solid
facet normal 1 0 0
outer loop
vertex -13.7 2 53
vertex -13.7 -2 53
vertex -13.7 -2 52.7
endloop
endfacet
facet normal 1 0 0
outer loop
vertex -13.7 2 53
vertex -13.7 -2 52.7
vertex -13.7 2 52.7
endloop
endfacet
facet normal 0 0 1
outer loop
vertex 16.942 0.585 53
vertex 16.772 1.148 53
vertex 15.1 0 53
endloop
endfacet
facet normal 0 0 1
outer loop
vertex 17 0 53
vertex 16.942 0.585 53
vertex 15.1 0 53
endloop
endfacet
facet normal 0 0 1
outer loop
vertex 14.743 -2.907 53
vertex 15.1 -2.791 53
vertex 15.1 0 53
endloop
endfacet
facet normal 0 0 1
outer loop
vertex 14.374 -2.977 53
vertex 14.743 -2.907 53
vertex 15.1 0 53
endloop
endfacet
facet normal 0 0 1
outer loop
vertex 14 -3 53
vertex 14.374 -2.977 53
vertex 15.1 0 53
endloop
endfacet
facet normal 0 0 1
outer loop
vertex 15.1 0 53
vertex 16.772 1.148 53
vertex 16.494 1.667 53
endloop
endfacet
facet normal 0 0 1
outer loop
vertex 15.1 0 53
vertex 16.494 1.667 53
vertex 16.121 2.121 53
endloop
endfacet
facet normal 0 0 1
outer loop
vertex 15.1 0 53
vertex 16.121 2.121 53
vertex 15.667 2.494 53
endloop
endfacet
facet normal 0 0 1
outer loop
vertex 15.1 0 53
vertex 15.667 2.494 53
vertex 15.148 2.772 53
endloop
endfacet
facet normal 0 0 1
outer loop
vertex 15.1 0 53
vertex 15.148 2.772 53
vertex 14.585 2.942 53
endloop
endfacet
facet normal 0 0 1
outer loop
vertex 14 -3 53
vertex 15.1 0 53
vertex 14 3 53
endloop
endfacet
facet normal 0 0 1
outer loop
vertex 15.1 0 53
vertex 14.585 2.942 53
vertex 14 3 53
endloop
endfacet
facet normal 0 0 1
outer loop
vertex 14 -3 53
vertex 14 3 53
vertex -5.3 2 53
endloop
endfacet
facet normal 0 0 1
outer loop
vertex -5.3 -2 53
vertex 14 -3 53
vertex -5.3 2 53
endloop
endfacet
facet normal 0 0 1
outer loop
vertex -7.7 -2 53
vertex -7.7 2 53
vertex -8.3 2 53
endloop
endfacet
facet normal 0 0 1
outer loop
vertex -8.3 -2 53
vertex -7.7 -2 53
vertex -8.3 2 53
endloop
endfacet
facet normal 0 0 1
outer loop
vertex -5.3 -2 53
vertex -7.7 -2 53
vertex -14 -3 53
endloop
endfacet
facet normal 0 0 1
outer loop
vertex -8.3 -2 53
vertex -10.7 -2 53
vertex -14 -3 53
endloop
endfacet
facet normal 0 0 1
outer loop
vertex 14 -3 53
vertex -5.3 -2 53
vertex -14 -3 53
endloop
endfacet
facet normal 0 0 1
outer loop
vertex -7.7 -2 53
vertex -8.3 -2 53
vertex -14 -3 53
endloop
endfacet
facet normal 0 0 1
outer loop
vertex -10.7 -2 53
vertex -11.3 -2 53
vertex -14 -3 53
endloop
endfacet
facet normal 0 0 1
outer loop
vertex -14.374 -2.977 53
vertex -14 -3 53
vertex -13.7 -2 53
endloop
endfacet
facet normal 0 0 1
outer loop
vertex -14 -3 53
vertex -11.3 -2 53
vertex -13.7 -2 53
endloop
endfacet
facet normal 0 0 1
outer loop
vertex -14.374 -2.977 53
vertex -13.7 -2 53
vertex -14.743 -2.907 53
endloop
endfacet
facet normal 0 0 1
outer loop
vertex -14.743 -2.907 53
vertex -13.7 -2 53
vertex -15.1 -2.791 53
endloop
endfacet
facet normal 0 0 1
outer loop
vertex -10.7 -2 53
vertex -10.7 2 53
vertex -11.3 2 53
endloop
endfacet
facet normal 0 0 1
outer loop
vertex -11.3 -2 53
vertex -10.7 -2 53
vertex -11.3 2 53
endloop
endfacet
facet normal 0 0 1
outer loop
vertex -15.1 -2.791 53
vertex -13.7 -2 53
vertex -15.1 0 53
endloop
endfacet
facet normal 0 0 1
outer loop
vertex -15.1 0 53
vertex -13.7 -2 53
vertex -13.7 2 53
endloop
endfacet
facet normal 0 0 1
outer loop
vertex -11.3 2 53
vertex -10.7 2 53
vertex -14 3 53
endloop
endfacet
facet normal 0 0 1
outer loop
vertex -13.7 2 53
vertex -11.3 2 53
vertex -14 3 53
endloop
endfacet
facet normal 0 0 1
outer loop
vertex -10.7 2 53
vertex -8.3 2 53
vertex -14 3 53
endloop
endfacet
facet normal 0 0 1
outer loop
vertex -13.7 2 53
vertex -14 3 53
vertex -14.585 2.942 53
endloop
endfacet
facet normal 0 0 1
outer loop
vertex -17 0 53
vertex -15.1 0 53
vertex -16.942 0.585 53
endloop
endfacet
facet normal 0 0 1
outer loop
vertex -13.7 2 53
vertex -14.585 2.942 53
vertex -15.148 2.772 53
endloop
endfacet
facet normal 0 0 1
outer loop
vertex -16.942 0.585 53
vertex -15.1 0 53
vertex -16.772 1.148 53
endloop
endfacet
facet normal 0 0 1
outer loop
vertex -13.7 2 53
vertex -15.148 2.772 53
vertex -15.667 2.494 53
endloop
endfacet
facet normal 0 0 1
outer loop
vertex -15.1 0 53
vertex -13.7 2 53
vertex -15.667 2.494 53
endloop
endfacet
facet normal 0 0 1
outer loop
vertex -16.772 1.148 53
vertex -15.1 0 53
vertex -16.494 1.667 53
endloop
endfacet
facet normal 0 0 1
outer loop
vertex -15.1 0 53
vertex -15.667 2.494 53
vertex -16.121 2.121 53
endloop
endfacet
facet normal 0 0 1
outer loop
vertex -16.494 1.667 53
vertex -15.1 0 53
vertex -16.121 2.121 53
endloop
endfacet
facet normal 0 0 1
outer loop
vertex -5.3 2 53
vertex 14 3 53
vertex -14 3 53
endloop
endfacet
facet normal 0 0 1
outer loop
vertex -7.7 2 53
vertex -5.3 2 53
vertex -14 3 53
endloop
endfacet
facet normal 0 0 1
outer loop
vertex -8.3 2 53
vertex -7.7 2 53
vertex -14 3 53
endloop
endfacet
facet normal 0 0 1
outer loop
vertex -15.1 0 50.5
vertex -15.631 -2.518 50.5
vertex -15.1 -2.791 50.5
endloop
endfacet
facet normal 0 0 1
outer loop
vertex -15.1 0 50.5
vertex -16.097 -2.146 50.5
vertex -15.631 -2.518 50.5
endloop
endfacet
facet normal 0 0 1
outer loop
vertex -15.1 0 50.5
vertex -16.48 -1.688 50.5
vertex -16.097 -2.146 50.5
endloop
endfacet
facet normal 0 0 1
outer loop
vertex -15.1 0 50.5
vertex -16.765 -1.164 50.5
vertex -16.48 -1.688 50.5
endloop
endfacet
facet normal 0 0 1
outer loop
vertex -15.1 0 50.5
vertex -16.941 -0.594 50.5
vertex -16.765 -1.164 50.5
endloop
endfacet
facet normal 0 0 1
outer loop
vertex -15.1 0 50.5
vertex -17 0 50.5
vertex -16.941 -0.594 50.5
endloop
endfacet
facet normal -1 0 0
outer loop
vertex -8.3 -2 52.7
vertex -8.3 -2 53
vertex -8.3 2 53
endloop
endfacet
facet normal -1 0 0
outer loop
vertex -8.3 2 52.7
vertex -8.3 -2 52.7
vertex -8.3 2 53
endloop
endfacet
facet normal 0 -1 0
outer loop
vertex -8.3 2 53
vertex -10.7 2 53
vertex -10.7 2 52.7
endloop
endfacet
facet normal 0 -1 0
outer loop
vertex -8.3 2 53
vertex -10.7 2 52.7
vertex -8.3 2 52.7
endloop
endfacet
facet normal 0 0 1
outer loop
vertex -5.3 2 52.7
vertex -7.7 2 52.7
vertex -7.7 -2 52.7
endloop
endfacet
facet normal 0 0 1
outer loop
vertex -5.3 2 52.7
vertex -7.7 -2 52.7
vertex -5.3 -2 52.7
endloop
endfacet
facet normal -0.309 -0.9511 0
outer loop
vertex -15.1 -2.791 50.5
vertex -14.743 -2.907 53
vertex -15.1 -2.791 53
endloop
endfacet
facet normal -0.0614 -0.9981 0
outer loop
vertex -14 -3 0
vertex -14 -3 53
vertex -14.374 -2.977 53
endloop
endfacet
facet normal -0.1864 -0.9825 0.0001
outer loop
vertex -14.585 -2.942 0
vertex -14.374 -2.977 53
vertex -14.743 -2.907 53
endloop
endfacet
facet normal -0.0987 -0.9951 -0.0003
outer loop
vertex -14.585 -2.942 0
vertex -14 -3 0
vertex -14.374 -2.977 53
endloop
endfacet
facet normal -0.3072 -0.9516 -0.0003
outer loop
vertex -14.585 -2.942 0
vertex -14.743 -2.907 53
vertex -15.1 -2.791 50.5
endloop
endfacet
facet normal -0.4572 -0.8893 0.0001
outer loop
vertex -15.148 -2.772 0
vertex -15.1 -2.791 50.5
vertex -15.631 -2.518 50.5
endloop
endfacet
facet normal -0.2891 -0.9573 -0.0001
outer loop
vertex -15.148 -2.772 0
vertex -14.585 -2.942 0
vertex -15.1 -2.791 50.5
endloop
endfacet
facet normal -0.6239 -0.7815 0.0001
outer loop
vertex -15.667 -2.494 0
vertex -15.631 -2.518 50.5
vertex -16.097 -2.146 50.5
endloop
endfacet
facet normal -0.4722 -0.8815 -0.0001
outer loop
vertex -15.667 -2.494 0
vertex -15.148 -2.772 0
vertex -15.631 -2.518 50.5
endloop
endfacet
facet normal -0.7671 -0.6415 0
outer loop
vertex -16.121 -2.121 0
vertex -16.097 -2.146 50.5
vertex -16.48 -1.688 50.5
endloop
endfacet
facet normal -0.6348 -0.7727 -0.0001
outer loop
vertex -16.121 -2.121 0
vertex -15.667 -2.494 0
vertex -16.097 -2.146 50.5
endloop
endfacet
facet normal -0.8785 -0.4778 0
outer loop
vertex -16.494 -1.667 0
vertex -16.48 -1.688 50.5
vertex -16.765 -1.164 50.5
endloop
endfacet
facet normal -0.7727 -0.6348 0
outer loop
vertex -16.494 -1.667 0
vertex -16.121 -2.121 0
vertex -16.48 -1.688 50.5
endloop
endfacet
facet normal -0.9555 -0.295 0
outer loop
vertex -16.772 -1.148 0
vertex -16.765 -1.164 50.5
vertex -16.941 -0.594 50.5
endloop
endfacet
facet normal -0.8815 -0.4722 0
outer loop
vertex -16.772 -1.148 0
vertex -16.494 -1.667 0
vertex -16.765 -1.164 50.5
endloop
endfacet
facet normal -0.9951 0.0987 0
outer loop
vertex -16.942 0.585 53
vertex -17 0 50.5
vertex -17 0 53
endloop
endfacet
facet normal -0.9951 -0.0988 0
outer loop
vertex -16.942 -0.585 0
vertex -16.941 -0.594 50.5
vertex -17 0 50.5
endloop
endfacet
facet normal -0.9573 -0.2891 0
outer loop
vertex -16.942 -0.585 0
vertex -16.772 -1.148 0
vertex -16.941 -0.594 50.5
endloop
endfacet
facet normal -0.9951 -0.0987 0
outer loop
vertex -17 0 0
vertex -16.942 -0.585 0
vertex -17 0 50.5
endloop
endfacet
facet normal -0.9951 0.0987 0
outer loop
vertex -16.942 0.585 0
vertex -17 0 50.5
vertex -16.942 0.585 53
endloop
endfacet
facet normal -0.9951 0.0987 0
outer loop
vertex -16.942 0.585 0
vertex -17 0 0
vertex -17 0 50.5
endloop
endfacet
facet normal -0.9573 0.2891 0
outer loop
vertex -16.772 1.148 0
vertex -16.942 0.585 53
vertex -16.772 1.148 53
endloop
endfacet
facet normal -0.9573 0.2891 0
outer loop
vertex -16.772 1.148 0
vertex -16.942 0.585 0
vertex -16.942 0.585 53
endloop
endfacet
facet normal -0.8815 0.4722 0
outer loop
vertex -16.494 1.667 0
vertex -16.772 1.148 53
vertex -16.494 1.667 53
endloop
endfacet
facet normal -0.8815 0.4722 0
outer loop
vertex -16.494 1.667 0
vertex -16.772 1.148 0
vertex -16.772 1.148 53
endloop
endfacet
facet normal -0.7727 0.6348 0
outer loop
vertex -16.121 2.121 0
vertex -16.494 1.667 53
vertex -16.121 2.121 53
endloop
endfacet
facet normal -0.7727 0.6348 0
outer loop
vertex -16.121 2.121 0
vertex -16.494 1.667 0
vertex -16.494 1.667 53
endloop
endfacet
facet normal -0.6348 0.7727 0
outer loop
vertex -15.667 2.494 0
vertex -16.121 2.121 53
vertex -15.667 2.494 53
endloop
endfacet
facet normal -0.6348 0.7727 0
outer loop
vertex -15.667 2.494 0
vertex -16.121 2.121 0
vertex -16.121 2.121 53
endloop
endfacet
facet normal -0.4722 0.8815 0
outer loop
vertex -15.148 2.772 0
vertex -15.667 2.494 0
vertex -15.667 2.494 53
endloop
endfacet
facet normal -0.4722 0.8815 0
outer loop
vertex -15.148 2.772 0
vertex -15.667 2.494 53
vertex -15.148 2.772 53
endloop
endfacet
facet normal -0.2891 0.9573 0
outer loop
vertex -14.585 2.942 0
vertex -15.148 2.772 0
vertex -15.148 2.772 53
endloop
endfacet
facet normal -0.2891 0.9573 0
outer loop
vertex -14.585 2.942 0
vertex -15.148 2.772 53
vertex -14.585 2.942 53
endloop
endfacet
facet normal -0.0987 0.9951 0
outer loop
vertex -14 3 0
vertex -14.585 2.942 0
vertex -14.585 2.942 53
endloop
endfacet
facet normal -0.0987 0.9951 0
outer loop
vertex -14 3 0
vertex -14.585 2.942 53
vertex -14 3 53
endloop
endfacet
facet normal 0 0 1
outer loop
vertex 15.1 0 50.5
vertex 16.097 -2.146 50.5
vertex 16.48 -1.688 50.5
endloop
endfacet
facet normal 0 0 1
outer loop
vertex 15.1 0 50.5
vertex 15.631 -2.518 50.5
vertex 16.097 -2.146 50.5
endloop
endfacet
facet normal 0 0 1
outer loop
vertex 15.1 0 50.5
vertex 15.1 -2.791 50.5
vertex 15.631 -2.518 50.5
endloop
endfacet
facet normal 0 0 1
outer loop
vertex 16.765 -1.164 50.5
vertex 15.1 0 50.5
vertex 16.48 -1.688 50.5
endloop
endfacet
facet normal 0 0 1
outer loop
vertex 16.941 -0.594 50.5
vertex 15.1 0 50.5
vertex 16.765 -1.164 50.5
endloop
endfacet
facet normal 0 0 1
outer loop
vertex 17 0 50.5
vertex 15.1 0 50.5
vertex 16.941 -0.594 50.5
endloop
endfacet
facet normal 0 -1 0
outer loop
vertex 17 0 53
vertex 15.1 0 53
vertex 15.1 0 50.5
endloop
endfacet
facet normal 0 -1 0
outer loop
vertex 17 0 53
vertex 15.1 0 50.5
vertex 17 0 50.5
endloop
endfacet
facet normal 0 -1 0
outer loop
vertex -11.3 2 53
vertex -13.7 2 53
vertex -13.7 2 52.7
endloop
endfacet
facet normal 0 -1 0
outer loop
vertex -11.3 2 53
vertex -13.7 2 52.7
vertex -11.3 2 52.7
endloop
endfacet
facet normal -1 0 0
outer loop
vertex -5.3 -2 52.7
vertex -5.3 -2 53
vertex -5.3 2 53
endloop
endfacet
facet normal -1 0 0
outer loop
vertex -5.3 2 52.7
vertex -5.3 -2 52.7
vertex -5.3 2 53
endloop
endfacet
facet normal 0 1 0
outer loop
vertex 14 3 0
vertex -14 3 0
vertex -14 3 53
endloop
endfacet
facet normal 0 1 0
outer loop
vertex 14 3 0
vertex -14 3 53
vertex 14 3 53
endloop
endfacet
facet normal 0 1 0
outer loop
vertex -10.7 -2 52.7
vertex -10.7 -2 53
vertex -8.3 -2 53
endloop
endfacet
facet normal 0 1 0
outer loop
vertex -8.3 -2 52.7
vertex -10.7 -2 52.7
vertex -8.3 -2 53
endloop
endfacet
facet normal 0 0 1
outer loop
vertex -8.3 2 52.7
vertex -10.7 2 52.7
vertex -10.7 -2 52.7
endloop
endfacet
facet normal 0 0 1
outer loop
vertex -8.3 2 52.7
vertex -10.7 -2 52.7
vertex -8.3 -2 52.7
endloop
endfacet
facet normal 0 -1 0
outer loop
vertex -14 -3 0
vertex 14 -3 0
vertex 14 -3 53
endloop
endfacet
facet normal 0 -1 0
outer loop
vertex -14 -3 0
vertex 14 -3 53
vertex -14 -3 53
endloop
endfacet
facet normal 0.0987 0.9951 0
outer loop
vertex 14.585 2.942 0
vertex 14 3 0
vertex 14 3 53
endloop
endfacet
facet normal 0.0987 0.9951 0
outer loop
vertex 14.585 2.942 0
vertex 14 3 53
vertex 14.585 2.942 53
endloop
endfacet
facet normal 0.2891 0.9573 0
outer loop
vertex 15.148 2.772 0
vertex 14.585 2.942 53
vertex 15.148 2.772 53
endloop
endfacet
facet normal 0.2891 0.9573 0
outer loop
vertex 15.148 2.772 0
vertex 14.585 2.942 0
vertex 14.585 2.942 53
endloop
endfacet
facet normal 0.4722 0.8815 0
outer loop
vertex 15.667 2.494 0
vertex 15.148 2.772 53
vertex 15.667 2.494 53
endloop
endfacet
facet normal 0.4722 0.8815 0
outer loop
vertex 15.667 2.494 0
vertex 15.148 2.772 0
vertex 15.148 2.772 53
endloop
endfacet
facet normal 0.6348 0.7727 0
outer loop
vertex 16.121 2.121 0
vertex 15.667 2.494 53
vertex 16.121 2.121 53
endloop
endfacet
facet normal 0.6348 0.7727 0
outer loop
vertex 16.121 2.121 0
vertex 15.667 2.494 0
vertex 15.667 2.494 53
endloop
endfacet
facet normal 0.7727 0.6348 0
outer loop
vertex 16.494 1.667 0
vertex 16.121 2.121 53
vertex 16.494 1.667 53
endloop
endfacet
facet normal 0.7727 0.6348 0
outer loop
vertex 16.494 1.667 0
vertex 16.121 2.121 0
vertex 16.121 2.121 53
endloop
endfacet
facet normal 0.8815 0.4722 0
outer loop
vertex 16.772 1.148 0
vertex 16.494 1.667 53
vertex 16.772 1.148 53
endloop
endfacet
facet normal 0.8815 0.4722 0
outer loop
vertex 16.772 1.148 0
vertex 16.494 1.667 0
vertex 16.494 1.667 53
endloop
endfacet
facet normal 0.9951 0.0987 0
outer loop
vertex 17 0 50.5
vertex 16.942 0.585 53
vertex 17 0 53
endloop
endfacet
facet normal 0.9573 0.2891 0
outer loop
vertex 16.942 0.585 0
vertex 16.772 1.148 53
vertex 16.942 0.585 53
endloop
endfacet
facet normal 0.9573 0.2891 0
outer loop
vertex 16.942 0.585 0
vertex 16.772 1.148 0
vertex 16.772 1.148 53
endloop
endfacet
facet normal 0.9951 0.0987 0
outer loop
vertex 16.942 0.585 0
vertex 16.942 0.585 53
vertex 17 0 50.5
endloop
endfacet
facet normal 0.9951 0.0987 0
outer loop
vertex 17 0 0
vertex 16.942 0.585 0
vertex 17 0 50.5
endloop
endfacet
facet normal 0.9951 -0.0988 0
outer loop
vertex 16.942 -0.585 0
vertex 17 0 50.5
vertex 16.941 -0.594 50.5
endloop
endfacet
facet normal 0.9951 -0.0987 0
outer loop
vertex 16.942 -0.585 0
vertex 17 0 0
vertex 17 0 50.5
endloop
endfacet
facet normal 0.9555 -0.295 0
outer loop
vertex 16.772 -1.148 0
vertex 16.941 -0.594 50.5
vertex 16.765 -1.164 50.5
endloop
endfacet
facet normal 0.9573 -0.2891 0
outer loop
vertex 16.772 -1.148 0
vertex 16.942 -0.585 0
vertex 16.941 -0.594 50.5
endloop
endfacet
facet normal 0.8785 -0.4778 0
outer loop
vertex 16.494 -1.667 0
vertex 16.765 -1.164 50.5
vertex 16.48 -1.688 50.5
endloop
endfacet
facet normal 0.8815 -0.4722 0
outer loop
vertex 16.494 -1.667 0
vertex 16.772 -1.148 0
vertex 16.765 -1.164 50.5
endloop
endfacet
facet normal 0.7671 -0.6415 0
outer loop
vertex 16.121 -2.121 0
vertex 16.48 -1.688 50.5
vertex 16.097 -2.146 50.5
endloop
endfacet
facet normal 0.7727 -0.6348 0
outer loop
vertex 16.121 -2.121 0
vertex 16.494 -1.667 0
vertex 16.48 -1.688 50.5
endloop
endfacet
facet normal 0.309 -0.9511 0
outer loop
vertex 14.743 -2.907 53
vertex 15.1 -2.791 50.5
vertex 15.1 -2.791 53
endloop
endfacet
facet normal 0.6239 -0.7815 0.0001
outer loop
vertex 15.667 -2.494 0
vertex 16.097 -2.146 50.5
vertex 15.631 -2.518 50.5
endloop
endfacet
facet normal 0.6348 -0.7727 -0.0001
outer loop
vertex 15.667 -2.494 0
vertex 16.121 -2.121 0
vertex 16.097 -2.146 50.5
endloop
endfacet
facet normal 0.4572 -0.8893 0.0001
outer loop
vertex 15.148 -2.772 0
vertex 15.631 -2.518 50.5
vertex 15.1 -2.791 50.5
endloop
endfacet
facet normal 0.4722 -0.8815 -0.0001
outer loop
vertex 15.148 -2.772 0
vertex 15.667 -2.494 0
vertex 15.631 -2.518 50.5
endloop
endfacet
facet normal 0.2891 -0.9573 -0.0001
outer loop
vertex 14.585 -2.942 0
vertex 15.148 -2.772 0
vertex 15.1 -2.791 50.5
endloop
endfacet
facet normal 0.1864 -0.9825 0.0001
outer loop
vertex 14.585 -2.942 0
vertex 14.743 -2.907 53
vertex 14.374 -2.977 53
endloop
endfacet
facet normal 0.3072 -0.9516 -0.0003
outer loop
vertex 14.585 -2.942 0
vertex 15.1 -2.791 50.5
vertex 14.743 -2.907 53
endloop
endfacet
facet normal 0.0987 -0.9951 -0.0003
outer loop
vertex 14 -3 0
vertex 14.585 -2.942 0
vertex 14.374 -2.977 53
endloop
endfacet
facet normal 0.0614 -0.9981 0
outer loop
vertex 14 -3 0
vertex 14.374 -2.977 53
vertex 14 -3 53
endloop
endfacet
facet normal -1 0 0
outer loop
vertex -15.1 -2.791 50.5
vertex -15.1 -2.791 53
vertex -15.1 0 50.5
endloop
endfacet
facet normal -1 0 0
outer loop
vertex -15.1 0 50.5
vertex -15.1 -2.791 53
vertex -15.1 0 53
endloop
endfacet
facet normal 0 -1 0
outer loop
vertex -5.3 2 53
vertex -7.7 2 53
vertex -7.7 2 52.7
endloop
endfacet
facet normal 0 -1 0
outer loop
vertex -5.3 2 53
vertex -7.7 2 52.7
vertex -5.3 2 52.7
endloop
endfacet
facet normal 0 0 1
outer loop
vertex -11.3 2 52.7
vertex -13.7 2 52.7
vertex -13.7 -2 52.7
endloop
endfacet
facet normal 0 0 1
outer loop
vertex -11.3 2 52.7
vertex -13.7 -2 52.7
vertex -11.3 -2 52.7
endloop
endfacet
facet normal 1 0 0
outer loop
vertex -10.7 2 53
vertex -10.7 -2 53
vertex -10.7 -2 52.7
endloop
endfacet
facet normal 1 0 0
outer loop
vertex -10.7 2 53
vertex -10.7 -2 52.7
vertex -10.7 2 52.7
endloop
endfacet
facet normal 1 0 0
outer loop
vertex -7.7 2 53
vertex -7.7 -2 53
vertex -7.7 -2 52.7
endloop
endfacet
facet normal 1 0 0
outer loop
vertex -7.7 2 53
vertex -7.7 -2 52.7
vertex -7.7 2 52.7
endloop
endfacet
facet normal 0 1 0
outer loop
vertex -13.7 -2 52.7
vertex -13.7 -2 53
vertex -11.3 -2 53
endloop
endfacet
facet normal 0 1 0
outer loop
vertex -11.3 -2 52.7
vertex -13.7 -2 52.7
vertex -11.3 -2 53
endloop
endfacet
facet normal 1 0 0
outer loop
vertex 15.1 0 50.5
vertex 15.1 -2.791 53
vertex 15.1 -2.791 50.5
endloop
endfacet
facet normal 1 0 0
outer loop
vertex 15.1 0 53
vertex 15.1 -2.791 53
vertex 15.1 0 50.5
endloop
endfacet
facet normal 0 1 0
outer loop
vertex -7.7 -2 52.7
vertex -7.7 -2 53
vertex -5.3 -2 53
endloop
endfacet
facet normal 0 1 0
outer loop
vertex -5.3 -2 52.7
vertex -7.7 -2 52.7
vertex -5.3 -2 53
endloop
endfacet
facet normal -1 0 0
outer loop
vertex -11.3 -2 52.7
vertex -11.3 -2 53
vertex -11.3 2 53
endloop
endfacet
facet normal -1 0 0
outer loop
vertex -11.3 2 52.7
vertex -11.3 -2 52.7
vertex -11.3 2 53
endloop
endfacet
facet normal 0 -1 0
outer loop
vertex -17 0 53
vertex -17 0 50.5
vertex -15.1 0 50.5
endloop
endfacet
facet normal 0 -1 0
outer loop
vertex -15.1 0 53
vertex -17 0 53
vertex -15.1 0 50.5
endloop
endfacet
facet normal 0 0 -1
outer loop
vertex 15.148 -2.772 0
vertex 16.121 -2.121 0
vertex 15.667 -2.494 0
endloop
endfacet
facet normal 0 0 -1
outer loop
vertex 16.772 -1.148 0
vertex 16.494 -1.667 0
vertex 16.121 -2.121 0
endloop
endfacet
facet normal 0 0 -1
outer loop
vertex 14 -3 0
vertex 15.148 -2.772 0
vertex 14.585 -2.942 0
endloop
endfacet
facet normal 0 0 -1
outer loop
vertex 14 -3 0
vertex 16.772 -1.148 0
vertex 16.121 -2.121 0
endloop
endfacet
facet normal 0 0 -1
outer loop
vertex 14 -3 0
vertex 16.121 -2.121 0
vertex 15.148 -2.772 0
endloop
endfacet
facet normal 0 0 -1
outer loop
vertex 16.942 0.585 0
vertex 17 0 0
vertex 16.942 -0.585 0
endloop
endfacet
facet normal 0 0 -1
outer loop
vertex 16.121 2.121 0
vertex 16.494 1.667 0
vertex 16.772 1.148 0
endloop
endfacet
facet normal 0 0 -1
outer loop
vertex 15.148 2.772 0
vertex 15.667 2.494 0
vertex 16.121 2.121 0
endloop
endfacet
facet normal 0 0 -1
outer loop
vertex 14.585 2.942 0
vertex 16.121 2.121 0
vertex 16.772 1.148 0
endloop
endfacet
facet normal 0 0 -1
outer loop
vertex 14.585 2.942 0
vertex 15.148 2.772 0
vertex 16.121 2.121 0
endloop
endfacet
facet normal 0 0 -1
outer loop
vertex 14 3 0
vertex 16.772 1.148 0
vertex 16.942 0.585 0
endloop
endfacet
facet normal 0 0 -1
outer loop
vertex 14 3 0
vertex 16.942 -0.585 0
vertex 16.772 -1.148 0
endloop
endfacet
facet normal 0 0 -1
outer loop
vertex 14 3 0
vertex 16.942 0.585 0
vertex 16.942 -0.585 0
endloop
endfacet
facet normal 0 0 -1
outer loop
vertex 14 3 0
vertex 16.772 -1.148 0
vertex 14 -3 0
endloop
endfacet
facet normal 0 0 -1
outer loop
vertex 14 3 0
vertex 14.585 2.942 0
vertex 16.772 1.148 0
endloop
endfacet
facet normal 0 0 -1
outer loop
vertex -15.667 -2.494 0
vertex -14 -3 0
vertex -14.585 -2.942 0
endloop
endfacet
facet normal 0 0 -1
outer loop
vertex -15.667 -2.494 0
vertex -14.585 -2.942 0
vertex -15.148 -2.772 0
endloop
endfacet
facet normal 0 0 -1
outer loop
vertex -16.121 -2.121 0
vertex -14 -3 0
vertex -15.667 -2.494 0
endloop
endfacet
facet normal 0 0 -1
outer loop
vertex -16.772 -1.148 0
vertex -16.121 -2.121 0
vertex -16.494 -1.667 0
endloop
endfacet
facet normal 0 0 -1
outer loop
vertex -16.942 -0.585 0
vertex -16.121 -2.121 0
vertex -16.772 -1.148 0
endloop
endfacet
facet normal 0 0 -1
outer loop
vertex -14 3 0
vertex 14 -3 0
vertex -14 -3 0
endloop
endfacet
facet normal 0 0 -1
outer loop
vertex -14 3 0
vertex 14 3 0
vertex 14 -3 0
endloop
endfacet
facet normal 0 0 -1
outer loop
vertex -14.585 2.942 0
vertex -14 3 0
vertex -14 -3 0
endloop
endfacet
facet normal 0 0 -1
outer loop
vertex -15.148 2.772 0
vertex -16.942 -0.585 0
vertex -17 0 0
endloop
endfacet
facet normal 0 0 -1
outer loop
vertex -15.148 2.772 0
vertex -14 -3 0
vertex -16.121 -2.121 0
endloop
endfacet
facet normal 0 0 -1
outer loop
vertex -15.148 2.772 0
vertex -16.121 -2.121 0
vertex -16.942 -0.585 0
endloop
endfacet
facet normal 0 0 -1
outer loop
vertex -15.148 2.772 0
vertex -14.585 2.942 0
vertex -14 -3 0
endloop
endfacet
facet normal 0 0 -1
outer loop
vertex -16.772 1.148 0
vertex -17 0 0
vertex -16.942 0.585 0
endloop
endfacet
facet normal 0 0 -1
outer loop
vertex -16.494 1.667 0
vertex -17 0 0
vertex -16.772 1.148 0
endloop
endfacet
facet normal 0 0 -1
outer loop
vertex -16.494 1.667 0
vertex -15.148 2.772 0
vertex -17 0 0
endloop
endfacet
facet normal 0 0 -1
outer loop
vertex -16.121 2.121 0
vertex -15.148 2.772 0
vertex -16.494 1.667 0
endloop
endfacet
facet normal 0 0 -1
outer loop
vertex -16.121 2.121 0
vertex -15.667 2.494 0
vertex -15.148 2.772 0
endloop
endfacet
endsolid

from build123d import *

# Parameters (mm, degrees)
BOSS_EXTRUDE1_DEPTH = 53
SKETCH2_W           = 2.4
SKETCH2_H           = 4
CUT_EXTRUDE1_DEPTH  = 0.3
SKETCH3_W           = 4
SKETCH3_H           = 4
CUT_EXTRUDE2_DEPTH  = 2.5


with BuildPart() as part:
    # Sketch1 → Boss-Extrude1 (new body)
    with BuildSketch(Plane.XY):
        with BuildLine():
            Line((-14, 3), (14, 3))
            ThreePointArc((14, 3), (17, 0), (14, -3))
            Line((14, -3), (-14, -3))
            ThreePointArc((-14, -3), (-17, 0), (-14, 3))
        make_face()
    extrude(amount=BOSS_EXTRUDE1_DEPTH)

    # Sketch2 → Cut-Extrude1 (cut)
    with BuildSketch(Plane.XY.offset(53)):
        with Locations((-12.5, 0)):
            Rectangle(SKETCH2_W, SKETCH2_H)
        with Locations((-9.5, 0)):
            Rectangle(SKETCH2_W, SKETCH2_H)
        with Locations((-6.5, 0)):
            Rectangle(SKETCH2_W, SKETCH2_H)
    extrude(amount=-CUT_EXTRUDE1_DEPTH, mode=Mode.SUBTRACT)

    # Sketch3 → Cut-Extrude2 (cut)
    with BuildSketch(Plane.XY.offset(53)):
        with Locations((-17.1, -2)):
            Rectangle(SKETCH3_W, SKETCH3_H)
        with Locations((17.1, -2)):
            Rectangle(SKETCH3_W, SKETCH3_H)
    extrude(amount=-CUT_EXTRUDE2_DEPTH, mode=Mode.SUBTRACT)


solid = part.part
